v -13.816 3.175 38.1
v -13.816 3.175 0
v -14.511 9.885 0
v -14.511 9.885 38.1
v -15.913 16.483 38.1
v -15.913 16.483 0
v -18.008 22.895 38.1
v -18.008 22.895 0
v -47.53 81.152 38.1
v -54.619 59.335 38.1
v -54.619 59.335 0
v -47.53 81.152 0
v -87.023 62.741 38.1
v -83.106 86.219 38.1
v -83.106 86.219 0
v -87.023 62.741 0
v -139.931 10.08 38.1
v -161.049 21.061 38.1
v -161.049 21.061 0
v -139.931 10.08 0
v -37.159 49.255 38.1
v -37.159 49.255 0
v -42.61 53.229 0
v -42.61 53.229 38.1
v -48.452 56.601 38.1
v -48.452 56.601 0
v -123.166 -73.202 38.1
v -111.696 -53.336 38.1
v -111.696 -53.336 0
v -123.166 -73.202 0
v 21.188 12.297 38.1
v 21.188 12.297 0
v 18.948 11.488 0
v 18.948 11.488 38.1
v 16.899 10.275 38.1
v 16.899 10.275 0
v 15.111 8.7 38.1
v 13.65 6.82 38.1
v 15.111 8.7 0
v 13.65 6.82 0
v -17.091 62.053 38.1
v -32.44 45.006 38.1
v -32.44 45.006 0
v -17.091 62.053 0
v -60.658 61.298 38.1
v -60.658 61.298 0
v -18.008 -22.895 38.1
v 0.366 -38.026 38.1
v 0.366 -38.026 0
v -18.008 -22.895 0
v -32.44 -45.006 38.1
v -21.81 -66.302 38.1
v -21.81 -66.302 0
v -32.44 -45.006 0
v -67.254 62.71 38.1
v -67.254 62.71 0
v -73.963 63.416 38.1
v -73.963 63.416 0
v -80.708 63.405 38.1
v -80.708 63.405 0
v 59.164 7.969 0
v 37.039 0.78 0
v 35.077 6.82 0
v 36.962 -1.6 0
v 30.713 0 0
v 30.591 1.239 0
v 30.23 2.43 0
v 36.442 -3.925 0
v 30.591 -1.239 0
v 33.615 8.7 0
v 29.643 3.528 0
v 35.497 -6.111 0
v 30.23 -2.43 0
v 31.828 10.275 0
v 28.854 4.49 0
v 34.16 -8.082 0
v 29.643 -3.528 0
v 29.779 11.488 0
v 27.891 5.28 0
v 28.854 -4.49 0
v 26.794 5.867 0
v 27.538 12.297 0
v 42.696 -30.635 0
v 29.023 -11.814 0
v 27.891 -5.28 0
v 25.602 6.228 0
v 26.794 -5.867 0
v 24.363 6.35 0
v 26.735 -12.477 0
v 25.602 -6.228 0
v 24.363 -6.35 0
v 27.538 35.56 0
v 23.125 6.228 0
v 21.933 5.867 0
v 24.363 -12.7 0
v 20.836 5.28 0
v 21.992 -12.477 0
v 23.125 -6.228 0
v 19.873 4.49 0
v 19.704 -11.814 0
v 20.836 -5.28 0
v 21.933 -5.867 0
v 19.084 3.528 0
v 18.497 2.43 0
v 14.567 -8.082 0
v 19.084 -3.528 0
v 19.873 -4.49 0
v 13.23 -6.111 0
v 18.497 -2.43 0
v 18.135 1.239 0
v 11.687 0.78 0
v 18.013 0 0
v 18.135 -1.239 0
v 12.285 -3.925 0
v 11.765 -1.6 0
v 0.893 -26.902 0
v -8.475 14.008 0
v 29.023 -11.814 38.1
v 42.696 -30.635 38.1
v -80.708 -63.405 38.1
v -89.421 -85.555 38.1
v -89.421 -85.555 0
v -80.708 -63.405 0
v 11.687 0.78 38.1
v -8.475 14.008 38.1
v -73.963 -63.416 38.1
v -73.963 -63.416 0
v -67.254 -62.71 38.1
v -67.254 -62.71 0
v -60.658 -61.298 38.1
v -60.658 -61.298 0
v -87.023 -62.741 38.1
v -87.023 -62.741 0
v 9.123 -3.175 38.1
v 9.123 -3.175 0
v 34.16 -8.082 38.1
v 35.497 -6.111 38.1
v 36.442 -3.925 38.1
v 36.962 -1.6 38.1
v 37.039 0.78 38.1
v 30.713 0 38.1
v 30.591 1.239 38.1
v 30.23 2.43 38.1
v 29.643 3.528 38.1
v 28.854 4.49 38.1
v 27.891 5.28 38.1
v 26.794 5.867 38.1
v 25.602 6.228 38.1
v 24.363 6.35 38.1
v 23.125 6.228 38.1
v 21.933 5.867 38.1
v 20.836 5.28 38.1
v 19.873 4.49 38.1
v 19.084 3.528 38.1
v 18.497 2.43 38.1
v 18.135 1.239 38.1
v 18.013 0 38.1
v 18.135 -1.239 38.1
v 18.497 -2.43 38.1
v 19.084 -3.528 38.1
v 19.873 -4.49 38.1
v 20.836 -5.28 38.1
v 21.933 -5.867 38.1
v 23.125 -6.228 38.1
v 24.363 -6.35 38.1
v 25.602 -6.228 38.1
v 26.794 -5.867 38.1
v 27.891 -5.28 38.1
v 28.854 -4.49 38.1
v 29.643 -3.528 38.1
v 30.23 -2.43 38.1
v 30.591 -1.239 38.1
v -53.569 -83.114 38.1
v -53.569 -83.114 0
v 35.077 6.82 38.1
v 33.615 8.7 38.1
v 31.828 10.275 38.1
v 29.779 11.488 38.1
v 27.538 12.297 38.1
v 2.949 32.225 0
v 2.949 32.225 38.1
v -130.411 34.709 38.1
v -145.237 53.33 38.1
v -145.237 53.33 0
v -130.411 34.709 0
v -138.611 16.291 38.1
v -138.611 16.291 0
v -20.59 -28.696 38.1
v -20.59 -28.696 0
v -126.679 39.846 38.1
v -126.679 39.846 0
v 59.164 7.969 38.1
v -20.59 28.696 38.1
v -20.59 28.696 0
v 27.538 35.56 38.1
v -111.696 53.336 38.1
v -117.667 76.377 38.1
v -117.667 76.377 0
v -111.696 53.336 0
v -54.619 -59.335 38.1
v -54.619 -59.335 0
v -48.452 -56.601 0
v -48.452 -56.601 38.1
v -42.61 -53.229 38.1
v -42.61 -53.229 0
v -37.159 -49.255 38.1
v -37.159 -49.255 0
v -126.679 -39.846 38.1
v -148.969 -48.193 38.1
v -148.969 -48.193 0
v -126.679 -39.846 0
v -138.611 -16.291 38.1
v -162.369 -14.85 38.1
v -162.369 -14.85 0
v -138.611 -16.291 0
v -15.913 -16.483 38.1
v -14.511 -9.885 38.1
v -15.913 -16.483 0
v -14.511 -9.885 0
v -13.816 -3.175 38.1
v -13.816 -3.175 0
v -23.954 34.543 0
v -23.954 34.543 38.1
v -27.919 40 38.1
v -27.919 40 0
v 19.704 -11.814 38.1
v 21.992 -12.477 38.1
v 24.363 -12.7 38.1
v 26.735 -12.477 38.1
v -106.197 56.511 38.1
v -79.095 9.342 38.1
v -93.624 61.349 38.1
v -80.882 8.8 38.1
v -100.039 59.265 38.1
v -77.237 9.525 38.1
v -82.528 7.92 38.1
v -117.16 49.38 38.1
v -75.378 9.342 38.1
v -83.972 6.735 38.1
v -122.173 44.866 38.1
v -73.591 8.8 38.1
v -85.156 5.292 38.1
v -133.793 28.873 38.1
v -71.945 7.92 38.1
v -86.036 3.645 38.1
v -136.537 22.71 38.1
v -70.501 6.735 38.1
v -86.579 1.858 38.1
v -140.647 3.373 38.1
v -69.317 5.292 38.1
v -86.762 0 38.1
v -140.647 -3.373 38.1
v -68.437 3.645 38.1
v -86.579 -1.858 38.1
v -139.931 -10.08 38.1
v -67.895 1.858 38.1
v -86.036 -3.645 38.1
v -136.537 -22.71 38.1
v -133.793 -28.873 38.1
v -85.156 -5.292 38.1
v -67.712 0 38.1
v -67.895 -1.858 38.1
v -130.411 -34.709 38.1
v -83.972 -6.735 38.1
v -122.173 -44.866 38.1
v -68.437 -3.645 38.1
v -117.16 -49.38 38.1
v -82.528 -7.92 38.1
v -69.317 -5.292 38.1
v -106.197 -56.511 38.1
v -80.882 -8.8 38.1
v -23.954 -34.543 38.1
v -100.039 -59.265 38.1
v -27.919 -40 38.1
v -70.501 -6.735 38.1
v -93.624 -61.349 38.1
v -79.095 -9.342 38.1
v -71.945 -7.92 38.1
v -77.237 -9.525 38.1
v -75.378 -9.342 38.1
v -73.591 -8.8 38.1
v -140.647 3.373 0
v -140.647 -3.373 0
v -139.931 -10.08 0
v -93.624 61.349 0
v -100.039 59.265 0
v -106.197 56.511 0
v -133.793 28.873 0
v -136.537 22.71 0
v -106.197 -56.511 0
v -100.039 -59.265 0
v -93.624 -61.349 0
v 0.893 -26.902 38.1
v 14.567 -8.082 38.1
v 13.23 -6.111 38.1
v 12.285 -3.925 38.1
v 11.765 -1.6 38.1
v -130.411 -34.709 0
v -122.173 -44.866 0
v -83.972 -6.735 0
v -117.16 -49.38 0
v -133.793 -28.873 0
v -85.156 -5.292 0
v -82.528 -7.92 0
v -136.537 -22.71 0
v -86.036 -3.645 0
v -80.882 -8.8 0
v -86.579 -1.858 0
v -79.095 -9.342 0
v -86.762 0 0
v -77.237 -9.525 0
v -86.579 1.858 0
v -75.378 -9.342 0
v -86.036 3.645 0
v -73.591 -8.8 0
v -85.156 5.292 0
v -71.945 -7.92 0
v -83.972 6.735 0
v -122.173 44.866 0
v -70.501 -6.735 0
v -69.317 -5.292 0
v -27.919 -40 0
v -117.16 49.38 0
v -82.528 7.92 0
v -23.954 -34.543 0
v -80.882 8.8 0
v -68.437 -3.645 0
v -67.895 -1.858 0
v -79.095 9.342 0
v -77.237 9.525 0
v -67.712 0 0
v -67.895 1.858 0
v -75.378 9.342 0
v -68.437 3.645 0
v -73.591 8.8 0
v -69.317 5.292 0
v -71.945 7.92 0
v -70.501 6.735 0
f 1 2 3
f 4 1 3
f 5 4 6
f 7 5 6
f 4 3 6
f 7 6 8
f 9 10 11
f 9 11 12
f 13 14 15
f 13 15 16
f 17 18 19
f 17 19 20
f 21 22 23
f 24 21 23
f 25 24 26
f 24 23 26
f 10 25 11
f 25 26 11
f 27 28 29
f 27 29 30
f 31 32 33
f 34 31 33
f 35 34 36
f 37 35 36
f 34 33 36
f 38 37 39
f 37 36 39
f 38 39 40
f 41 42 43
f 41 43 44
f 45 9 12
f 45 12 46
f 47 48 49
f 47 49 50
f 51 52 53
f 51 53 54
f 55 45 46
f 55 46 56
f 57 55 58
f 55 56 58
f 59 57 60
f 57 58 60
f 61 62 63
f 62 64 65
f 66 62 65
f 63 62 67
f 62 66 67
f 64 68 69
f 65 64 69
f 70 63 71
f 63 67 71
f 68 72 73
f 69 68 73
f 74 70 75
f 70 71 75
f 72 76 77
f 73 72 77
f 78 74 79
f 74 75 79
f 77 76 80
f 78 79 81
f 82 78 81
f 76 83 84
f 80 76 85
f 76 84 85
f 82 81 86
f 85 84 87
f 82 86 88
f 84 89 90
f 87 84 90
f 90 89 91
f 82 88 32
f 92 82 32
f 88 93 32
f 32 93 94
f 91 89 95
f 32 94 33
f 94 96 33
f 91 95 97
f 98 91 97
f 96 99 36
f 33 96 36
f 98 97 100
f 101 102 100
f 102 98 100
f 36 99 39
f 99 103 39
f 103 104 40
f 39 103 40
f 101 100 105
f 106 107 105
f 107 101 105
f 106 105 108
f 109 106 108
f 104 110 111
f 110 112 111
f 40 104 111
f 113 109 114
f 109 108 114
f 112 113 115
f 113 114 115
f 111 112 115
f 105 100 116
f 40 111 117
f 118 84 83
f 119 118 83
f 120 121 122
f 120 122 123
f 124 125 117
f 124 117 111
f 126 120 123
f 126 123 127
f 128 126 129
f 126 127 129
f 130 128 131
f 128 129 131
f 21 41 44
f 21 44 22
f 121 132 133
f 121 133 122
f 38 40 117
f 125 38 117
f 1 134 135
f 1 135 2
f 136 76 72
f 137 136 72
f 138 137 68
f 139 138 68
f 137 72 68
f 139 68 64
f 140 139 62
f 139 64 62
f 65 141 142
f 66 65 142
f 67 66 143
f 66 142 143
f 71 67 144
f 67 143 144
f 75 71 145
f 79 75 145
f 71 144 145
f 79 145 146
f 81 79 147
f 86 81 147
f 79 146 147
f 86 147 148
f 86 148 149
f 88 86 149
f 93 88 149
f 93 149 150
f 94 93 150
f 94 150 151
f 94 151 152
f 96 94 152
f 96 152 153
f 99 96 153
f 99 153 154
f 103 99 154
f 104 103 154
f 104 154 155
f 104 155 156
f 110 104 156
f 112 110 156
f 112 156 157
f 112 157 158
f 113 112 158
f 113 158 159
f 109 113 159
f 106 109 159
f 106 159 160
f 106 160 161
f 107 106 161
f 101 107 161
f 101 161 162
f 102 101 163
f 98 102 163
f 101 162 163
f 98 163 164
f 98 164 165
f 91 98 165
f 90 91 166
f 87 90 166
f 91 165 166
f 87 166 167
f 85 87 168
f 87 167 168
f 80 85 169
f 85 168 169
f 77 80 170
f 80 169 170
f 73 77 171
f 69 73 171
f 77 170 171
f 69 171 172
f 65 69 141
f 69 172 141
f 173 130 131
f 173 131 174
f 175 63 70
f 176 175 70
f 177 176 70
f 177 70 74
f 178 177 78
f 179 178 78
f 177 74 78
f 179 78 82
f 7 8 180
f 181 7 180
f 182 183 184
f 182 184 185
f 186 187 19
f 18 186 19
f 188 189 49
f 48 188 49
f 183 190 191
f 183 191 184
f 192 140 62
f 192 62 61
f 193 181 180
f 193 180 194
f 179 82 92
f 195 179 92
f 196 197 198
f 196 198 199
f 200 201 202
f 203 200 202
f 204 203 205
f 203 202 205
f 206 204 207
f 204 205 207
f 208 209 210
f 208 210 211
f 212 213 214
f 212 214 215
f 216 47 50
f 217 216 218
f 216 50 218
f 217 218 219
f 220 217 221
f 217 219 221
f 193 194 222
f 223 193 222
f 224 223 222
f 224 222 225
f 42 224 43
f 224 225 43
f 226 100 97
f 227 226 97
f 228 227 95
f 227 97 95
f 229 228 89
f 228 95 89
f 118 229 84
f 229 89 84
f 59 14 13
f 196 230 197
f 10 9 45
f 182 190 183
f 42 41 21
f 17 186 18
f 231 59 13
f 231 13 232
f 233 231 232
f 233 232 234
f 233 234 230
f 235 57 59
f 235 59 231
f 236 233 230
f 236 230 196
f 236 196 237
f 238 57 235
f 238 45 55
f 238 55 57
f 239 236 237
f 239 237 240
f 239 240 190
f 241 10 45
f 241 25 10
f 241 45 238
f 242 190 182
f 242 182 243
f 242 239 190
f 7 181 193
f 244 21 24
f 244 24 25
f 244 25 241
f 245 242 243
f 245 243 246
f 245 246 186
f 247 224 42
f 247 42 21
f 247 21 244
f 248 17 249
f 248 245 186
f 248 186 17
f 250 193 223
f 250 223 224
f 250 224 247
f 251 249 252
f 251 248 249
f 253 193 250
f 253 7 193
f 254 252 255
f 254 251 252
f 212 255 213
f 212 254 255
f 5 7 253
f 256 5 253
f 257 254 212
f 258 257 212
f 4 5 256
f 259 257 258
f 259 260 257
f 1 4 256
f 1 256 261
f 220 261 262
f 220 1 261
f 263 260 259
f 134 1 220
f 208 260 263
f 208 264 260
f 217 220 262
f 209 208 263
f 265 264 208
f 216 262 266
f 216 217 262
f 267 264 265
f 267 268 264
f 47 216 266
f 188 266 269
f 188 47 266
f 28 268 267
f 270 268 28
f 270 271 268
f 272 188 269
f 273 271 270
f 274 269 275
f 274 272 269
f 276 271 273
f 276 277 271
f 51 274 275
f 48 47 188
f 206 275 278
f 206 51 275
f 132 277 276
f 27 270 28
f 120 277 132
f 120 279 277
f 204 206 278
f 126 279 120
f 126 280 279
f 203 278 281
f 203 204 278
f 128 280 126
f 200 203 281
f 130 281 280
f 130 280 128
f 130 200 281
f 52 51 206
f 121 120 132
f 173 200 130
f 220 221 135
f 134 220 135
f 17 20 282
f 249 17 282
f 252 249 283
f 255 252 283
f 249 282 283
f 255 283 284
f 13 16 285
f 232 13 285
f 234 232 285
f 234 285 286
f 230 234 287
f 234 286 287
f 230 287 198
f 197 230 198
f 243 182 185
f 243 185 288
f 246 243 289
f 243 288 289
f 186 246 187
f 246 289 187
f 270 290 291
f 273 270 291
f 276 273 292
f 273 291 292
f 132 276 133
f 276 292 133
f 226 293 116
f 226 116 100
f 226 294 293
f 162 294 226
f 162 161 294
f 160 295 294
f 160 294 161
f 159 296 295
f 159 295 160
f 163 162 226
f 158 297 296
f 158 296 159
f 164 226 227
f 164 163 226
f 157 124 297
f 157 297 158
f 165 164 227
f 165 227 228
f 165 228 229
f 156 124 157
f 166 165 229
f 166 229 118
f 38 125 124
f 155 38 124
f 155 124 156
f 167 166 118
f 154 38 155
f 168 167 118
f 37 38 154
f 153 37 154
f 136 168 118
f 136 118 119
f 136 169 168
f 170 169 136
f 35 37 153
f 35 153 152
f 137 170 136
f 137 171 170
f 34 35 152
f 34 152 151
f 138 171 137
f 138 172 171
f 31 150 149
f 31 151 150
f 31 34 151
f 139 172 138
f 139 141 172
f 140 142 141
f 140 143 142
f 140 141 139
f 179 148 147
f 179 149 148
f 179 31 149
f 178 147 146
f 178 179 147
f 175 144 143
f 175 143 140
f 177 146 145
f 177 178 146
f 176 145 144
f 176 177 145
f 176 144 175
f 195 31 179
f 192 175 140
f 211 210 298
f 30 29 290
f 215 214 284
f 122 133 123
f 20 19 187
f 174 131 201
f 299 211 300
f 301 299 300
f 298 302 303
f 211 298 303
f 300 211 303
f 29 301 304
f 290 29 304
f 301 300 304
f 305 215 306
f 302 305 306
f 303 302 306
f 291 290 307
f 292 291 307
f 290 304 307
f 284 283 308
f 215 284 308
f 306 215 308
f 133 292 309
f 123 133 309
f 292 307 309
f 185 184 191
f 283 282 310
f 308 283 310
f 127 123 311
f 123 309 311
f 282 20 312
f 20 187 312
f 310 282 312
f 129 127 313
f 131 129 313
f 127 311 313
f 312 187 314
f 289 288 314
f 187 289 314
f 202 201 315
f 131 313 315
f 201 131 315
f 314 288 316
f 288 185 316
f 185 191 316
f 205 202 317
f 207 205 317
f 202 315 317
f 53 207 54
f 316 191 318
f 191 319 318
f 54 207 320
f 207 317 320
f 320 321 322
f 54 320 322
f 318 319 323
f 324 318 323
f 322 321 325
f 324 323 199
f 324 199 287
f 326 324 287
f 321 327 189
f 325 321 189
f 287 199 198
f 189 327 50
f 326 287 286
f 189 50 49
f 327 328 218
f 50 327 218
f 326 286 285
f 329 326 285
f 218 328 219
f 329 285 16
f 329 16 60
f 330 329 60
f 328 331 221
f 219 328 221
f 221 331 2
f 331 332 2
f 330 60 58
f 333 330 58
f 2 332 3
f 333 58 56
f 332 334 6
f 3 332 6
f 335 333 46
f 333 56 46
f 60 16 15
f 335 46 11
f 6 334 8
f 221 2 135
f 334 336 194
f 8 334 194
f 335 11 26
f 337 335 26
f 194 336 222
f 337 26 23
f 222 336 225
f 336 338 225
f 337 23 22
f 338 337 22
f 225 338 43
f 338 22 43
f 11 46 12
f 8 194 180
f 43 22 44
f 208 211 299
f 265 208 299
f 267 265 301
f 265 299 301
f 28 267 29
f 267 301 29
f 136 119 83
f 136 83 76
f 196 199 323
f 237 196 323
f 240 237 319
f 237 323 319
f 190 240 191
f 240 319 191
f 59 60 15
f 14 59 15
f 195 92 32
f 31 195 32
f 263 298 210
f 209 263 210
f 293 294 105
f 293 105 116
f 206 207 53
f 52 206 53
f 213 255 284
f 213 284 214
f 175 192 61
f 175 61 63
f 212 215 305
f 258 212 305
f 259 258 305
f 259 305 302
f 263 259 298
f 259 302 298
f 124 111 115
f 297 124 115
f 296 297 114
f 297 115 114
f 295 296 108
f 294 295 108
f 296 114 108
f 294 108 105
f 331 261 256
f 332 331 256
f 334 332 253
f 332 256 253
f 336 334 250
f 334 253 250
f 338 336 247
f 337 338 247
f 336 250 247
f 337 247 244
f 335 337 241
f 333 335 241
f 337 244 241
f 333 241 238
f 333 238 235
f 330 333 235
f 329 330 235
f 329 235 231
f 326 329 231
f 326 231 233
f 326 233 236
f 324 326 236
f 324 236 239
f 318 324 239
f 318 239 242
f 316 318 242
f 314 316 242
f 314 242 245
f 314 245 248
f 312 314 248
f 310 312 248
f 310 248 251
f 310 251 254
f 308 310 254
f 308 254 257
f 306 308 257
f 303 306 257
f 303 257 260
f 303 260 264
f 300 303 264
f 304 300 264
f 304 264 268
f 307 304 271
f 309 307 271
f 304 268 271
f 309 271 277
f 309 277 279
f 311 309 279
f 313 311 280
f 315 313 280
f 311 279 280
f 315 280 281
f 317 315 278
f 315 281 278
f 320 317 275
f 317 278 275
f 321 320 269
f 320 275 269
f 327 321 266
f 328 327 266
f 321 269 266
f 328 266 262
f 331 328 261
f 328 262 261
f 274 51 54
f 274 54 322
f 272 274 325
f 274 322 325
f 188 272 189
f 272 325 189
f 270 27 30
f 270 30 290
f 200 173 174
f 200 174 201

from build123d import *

# Parameters (mm, degrees)
F0_R            = 63.5
F1_DEPTH        = 38.1
F0_R_2          = 12.7
F3_DEPTH        = 38.1
F3_COPIES_COUNT = 15
F6_DEPTH        = 38.1
F6_COPIES_COUNT = 5
F7_R            = 9.525
F7_R_2          = 6.35
F8_DEPTH        = 38.101


# Not quite as in the source:
# - a pattern or mirror of a feature is missing from the dataset's text; its kind, count and spacing are read off the source's solid


with BuildPart() as f1:
    # F0 (on Top) → F1 (new body)
    with BuildSketch(Plane.XY):
        with Locations((-77.2365369129, 0)):
            Circle(F0_R)
    extrude(amount=F1_DEPTH)

    # F2 (on face) → F3 (join)
    with BuildSketch(Plane.XY.offset(38.1)):
        Polygon((-13.8159615844, 3.175), (-77.2365369129, 3.175), (-77.2365369129, -3.175), (9.1234630871, -3.175), align=None)
    f3 = extrude(amount=-F3_DEPTH)

    # F3_copies: F3 ×15 about axis
    f3_copies_axis = Axis((-77.236537, 0, 0), (0, 0, 1))
    for i in range(1, F3_COPIES_COUNT):
        add(f3.rotate(f3_copies_axis, i * 360 / F3_COPIES_COUNT))


with BuildPart() as f1b:
    # F0 (on Top) → F1, piece 2 (new body)
    with BuildSketch(Plane.XY):
        with Locations((24.3634630871, 0)):
            Circle(F0_R_2)
    extrude(amount=F1_DEPTH)

    # F5 (on face) → F6 (join)
    with BuildSketch(Plane.XY.offset(38.1)):
        Polygon((21.1884630871, 0), (27.5384630871, 0), (27.5384630871, 35.56), (21.1884630871, 12.2967221242), align=None)
    f6 = extrude(amount=-F6_DEPTH)

    # F6_copies: F6 ×5 about axis
    f6_copies_axis = Axis((24.363463, 0, 0), (0, 0, 1))
    for i in range(1, F6_COPIES_COUNT):
        add(f6.rotate(f6_copies_axis, i * 360 / F6_COPIES_COUNT))


with BuildPart() as f8_tool:
    # F7 (on face) → F8 (new body, through all)
    with BuildSketch(Plane.XY.offset(38.1)):
        with Locations((-77.2365369129, 0)):
            Circle(F7_R)
        with Locations((24.3634630871, 0)):
            Circle(F7_R_2)
    extrude(amount=-F8_DEPTH)


with BuildPart() as f1_1:
    add(f1.part)

    # F8: cut by f8_tool
    add(f8_tool.part, mode=Mode.SUBTRACT)


with BuildPart() as f1b_1:
    add(f1b.part)

    # F8: cut by f8_tool
    add(f8_tool.part, mode=Mode.SUBTRACT)


solid = Compound([f1_1.part, f1b_1.part])
